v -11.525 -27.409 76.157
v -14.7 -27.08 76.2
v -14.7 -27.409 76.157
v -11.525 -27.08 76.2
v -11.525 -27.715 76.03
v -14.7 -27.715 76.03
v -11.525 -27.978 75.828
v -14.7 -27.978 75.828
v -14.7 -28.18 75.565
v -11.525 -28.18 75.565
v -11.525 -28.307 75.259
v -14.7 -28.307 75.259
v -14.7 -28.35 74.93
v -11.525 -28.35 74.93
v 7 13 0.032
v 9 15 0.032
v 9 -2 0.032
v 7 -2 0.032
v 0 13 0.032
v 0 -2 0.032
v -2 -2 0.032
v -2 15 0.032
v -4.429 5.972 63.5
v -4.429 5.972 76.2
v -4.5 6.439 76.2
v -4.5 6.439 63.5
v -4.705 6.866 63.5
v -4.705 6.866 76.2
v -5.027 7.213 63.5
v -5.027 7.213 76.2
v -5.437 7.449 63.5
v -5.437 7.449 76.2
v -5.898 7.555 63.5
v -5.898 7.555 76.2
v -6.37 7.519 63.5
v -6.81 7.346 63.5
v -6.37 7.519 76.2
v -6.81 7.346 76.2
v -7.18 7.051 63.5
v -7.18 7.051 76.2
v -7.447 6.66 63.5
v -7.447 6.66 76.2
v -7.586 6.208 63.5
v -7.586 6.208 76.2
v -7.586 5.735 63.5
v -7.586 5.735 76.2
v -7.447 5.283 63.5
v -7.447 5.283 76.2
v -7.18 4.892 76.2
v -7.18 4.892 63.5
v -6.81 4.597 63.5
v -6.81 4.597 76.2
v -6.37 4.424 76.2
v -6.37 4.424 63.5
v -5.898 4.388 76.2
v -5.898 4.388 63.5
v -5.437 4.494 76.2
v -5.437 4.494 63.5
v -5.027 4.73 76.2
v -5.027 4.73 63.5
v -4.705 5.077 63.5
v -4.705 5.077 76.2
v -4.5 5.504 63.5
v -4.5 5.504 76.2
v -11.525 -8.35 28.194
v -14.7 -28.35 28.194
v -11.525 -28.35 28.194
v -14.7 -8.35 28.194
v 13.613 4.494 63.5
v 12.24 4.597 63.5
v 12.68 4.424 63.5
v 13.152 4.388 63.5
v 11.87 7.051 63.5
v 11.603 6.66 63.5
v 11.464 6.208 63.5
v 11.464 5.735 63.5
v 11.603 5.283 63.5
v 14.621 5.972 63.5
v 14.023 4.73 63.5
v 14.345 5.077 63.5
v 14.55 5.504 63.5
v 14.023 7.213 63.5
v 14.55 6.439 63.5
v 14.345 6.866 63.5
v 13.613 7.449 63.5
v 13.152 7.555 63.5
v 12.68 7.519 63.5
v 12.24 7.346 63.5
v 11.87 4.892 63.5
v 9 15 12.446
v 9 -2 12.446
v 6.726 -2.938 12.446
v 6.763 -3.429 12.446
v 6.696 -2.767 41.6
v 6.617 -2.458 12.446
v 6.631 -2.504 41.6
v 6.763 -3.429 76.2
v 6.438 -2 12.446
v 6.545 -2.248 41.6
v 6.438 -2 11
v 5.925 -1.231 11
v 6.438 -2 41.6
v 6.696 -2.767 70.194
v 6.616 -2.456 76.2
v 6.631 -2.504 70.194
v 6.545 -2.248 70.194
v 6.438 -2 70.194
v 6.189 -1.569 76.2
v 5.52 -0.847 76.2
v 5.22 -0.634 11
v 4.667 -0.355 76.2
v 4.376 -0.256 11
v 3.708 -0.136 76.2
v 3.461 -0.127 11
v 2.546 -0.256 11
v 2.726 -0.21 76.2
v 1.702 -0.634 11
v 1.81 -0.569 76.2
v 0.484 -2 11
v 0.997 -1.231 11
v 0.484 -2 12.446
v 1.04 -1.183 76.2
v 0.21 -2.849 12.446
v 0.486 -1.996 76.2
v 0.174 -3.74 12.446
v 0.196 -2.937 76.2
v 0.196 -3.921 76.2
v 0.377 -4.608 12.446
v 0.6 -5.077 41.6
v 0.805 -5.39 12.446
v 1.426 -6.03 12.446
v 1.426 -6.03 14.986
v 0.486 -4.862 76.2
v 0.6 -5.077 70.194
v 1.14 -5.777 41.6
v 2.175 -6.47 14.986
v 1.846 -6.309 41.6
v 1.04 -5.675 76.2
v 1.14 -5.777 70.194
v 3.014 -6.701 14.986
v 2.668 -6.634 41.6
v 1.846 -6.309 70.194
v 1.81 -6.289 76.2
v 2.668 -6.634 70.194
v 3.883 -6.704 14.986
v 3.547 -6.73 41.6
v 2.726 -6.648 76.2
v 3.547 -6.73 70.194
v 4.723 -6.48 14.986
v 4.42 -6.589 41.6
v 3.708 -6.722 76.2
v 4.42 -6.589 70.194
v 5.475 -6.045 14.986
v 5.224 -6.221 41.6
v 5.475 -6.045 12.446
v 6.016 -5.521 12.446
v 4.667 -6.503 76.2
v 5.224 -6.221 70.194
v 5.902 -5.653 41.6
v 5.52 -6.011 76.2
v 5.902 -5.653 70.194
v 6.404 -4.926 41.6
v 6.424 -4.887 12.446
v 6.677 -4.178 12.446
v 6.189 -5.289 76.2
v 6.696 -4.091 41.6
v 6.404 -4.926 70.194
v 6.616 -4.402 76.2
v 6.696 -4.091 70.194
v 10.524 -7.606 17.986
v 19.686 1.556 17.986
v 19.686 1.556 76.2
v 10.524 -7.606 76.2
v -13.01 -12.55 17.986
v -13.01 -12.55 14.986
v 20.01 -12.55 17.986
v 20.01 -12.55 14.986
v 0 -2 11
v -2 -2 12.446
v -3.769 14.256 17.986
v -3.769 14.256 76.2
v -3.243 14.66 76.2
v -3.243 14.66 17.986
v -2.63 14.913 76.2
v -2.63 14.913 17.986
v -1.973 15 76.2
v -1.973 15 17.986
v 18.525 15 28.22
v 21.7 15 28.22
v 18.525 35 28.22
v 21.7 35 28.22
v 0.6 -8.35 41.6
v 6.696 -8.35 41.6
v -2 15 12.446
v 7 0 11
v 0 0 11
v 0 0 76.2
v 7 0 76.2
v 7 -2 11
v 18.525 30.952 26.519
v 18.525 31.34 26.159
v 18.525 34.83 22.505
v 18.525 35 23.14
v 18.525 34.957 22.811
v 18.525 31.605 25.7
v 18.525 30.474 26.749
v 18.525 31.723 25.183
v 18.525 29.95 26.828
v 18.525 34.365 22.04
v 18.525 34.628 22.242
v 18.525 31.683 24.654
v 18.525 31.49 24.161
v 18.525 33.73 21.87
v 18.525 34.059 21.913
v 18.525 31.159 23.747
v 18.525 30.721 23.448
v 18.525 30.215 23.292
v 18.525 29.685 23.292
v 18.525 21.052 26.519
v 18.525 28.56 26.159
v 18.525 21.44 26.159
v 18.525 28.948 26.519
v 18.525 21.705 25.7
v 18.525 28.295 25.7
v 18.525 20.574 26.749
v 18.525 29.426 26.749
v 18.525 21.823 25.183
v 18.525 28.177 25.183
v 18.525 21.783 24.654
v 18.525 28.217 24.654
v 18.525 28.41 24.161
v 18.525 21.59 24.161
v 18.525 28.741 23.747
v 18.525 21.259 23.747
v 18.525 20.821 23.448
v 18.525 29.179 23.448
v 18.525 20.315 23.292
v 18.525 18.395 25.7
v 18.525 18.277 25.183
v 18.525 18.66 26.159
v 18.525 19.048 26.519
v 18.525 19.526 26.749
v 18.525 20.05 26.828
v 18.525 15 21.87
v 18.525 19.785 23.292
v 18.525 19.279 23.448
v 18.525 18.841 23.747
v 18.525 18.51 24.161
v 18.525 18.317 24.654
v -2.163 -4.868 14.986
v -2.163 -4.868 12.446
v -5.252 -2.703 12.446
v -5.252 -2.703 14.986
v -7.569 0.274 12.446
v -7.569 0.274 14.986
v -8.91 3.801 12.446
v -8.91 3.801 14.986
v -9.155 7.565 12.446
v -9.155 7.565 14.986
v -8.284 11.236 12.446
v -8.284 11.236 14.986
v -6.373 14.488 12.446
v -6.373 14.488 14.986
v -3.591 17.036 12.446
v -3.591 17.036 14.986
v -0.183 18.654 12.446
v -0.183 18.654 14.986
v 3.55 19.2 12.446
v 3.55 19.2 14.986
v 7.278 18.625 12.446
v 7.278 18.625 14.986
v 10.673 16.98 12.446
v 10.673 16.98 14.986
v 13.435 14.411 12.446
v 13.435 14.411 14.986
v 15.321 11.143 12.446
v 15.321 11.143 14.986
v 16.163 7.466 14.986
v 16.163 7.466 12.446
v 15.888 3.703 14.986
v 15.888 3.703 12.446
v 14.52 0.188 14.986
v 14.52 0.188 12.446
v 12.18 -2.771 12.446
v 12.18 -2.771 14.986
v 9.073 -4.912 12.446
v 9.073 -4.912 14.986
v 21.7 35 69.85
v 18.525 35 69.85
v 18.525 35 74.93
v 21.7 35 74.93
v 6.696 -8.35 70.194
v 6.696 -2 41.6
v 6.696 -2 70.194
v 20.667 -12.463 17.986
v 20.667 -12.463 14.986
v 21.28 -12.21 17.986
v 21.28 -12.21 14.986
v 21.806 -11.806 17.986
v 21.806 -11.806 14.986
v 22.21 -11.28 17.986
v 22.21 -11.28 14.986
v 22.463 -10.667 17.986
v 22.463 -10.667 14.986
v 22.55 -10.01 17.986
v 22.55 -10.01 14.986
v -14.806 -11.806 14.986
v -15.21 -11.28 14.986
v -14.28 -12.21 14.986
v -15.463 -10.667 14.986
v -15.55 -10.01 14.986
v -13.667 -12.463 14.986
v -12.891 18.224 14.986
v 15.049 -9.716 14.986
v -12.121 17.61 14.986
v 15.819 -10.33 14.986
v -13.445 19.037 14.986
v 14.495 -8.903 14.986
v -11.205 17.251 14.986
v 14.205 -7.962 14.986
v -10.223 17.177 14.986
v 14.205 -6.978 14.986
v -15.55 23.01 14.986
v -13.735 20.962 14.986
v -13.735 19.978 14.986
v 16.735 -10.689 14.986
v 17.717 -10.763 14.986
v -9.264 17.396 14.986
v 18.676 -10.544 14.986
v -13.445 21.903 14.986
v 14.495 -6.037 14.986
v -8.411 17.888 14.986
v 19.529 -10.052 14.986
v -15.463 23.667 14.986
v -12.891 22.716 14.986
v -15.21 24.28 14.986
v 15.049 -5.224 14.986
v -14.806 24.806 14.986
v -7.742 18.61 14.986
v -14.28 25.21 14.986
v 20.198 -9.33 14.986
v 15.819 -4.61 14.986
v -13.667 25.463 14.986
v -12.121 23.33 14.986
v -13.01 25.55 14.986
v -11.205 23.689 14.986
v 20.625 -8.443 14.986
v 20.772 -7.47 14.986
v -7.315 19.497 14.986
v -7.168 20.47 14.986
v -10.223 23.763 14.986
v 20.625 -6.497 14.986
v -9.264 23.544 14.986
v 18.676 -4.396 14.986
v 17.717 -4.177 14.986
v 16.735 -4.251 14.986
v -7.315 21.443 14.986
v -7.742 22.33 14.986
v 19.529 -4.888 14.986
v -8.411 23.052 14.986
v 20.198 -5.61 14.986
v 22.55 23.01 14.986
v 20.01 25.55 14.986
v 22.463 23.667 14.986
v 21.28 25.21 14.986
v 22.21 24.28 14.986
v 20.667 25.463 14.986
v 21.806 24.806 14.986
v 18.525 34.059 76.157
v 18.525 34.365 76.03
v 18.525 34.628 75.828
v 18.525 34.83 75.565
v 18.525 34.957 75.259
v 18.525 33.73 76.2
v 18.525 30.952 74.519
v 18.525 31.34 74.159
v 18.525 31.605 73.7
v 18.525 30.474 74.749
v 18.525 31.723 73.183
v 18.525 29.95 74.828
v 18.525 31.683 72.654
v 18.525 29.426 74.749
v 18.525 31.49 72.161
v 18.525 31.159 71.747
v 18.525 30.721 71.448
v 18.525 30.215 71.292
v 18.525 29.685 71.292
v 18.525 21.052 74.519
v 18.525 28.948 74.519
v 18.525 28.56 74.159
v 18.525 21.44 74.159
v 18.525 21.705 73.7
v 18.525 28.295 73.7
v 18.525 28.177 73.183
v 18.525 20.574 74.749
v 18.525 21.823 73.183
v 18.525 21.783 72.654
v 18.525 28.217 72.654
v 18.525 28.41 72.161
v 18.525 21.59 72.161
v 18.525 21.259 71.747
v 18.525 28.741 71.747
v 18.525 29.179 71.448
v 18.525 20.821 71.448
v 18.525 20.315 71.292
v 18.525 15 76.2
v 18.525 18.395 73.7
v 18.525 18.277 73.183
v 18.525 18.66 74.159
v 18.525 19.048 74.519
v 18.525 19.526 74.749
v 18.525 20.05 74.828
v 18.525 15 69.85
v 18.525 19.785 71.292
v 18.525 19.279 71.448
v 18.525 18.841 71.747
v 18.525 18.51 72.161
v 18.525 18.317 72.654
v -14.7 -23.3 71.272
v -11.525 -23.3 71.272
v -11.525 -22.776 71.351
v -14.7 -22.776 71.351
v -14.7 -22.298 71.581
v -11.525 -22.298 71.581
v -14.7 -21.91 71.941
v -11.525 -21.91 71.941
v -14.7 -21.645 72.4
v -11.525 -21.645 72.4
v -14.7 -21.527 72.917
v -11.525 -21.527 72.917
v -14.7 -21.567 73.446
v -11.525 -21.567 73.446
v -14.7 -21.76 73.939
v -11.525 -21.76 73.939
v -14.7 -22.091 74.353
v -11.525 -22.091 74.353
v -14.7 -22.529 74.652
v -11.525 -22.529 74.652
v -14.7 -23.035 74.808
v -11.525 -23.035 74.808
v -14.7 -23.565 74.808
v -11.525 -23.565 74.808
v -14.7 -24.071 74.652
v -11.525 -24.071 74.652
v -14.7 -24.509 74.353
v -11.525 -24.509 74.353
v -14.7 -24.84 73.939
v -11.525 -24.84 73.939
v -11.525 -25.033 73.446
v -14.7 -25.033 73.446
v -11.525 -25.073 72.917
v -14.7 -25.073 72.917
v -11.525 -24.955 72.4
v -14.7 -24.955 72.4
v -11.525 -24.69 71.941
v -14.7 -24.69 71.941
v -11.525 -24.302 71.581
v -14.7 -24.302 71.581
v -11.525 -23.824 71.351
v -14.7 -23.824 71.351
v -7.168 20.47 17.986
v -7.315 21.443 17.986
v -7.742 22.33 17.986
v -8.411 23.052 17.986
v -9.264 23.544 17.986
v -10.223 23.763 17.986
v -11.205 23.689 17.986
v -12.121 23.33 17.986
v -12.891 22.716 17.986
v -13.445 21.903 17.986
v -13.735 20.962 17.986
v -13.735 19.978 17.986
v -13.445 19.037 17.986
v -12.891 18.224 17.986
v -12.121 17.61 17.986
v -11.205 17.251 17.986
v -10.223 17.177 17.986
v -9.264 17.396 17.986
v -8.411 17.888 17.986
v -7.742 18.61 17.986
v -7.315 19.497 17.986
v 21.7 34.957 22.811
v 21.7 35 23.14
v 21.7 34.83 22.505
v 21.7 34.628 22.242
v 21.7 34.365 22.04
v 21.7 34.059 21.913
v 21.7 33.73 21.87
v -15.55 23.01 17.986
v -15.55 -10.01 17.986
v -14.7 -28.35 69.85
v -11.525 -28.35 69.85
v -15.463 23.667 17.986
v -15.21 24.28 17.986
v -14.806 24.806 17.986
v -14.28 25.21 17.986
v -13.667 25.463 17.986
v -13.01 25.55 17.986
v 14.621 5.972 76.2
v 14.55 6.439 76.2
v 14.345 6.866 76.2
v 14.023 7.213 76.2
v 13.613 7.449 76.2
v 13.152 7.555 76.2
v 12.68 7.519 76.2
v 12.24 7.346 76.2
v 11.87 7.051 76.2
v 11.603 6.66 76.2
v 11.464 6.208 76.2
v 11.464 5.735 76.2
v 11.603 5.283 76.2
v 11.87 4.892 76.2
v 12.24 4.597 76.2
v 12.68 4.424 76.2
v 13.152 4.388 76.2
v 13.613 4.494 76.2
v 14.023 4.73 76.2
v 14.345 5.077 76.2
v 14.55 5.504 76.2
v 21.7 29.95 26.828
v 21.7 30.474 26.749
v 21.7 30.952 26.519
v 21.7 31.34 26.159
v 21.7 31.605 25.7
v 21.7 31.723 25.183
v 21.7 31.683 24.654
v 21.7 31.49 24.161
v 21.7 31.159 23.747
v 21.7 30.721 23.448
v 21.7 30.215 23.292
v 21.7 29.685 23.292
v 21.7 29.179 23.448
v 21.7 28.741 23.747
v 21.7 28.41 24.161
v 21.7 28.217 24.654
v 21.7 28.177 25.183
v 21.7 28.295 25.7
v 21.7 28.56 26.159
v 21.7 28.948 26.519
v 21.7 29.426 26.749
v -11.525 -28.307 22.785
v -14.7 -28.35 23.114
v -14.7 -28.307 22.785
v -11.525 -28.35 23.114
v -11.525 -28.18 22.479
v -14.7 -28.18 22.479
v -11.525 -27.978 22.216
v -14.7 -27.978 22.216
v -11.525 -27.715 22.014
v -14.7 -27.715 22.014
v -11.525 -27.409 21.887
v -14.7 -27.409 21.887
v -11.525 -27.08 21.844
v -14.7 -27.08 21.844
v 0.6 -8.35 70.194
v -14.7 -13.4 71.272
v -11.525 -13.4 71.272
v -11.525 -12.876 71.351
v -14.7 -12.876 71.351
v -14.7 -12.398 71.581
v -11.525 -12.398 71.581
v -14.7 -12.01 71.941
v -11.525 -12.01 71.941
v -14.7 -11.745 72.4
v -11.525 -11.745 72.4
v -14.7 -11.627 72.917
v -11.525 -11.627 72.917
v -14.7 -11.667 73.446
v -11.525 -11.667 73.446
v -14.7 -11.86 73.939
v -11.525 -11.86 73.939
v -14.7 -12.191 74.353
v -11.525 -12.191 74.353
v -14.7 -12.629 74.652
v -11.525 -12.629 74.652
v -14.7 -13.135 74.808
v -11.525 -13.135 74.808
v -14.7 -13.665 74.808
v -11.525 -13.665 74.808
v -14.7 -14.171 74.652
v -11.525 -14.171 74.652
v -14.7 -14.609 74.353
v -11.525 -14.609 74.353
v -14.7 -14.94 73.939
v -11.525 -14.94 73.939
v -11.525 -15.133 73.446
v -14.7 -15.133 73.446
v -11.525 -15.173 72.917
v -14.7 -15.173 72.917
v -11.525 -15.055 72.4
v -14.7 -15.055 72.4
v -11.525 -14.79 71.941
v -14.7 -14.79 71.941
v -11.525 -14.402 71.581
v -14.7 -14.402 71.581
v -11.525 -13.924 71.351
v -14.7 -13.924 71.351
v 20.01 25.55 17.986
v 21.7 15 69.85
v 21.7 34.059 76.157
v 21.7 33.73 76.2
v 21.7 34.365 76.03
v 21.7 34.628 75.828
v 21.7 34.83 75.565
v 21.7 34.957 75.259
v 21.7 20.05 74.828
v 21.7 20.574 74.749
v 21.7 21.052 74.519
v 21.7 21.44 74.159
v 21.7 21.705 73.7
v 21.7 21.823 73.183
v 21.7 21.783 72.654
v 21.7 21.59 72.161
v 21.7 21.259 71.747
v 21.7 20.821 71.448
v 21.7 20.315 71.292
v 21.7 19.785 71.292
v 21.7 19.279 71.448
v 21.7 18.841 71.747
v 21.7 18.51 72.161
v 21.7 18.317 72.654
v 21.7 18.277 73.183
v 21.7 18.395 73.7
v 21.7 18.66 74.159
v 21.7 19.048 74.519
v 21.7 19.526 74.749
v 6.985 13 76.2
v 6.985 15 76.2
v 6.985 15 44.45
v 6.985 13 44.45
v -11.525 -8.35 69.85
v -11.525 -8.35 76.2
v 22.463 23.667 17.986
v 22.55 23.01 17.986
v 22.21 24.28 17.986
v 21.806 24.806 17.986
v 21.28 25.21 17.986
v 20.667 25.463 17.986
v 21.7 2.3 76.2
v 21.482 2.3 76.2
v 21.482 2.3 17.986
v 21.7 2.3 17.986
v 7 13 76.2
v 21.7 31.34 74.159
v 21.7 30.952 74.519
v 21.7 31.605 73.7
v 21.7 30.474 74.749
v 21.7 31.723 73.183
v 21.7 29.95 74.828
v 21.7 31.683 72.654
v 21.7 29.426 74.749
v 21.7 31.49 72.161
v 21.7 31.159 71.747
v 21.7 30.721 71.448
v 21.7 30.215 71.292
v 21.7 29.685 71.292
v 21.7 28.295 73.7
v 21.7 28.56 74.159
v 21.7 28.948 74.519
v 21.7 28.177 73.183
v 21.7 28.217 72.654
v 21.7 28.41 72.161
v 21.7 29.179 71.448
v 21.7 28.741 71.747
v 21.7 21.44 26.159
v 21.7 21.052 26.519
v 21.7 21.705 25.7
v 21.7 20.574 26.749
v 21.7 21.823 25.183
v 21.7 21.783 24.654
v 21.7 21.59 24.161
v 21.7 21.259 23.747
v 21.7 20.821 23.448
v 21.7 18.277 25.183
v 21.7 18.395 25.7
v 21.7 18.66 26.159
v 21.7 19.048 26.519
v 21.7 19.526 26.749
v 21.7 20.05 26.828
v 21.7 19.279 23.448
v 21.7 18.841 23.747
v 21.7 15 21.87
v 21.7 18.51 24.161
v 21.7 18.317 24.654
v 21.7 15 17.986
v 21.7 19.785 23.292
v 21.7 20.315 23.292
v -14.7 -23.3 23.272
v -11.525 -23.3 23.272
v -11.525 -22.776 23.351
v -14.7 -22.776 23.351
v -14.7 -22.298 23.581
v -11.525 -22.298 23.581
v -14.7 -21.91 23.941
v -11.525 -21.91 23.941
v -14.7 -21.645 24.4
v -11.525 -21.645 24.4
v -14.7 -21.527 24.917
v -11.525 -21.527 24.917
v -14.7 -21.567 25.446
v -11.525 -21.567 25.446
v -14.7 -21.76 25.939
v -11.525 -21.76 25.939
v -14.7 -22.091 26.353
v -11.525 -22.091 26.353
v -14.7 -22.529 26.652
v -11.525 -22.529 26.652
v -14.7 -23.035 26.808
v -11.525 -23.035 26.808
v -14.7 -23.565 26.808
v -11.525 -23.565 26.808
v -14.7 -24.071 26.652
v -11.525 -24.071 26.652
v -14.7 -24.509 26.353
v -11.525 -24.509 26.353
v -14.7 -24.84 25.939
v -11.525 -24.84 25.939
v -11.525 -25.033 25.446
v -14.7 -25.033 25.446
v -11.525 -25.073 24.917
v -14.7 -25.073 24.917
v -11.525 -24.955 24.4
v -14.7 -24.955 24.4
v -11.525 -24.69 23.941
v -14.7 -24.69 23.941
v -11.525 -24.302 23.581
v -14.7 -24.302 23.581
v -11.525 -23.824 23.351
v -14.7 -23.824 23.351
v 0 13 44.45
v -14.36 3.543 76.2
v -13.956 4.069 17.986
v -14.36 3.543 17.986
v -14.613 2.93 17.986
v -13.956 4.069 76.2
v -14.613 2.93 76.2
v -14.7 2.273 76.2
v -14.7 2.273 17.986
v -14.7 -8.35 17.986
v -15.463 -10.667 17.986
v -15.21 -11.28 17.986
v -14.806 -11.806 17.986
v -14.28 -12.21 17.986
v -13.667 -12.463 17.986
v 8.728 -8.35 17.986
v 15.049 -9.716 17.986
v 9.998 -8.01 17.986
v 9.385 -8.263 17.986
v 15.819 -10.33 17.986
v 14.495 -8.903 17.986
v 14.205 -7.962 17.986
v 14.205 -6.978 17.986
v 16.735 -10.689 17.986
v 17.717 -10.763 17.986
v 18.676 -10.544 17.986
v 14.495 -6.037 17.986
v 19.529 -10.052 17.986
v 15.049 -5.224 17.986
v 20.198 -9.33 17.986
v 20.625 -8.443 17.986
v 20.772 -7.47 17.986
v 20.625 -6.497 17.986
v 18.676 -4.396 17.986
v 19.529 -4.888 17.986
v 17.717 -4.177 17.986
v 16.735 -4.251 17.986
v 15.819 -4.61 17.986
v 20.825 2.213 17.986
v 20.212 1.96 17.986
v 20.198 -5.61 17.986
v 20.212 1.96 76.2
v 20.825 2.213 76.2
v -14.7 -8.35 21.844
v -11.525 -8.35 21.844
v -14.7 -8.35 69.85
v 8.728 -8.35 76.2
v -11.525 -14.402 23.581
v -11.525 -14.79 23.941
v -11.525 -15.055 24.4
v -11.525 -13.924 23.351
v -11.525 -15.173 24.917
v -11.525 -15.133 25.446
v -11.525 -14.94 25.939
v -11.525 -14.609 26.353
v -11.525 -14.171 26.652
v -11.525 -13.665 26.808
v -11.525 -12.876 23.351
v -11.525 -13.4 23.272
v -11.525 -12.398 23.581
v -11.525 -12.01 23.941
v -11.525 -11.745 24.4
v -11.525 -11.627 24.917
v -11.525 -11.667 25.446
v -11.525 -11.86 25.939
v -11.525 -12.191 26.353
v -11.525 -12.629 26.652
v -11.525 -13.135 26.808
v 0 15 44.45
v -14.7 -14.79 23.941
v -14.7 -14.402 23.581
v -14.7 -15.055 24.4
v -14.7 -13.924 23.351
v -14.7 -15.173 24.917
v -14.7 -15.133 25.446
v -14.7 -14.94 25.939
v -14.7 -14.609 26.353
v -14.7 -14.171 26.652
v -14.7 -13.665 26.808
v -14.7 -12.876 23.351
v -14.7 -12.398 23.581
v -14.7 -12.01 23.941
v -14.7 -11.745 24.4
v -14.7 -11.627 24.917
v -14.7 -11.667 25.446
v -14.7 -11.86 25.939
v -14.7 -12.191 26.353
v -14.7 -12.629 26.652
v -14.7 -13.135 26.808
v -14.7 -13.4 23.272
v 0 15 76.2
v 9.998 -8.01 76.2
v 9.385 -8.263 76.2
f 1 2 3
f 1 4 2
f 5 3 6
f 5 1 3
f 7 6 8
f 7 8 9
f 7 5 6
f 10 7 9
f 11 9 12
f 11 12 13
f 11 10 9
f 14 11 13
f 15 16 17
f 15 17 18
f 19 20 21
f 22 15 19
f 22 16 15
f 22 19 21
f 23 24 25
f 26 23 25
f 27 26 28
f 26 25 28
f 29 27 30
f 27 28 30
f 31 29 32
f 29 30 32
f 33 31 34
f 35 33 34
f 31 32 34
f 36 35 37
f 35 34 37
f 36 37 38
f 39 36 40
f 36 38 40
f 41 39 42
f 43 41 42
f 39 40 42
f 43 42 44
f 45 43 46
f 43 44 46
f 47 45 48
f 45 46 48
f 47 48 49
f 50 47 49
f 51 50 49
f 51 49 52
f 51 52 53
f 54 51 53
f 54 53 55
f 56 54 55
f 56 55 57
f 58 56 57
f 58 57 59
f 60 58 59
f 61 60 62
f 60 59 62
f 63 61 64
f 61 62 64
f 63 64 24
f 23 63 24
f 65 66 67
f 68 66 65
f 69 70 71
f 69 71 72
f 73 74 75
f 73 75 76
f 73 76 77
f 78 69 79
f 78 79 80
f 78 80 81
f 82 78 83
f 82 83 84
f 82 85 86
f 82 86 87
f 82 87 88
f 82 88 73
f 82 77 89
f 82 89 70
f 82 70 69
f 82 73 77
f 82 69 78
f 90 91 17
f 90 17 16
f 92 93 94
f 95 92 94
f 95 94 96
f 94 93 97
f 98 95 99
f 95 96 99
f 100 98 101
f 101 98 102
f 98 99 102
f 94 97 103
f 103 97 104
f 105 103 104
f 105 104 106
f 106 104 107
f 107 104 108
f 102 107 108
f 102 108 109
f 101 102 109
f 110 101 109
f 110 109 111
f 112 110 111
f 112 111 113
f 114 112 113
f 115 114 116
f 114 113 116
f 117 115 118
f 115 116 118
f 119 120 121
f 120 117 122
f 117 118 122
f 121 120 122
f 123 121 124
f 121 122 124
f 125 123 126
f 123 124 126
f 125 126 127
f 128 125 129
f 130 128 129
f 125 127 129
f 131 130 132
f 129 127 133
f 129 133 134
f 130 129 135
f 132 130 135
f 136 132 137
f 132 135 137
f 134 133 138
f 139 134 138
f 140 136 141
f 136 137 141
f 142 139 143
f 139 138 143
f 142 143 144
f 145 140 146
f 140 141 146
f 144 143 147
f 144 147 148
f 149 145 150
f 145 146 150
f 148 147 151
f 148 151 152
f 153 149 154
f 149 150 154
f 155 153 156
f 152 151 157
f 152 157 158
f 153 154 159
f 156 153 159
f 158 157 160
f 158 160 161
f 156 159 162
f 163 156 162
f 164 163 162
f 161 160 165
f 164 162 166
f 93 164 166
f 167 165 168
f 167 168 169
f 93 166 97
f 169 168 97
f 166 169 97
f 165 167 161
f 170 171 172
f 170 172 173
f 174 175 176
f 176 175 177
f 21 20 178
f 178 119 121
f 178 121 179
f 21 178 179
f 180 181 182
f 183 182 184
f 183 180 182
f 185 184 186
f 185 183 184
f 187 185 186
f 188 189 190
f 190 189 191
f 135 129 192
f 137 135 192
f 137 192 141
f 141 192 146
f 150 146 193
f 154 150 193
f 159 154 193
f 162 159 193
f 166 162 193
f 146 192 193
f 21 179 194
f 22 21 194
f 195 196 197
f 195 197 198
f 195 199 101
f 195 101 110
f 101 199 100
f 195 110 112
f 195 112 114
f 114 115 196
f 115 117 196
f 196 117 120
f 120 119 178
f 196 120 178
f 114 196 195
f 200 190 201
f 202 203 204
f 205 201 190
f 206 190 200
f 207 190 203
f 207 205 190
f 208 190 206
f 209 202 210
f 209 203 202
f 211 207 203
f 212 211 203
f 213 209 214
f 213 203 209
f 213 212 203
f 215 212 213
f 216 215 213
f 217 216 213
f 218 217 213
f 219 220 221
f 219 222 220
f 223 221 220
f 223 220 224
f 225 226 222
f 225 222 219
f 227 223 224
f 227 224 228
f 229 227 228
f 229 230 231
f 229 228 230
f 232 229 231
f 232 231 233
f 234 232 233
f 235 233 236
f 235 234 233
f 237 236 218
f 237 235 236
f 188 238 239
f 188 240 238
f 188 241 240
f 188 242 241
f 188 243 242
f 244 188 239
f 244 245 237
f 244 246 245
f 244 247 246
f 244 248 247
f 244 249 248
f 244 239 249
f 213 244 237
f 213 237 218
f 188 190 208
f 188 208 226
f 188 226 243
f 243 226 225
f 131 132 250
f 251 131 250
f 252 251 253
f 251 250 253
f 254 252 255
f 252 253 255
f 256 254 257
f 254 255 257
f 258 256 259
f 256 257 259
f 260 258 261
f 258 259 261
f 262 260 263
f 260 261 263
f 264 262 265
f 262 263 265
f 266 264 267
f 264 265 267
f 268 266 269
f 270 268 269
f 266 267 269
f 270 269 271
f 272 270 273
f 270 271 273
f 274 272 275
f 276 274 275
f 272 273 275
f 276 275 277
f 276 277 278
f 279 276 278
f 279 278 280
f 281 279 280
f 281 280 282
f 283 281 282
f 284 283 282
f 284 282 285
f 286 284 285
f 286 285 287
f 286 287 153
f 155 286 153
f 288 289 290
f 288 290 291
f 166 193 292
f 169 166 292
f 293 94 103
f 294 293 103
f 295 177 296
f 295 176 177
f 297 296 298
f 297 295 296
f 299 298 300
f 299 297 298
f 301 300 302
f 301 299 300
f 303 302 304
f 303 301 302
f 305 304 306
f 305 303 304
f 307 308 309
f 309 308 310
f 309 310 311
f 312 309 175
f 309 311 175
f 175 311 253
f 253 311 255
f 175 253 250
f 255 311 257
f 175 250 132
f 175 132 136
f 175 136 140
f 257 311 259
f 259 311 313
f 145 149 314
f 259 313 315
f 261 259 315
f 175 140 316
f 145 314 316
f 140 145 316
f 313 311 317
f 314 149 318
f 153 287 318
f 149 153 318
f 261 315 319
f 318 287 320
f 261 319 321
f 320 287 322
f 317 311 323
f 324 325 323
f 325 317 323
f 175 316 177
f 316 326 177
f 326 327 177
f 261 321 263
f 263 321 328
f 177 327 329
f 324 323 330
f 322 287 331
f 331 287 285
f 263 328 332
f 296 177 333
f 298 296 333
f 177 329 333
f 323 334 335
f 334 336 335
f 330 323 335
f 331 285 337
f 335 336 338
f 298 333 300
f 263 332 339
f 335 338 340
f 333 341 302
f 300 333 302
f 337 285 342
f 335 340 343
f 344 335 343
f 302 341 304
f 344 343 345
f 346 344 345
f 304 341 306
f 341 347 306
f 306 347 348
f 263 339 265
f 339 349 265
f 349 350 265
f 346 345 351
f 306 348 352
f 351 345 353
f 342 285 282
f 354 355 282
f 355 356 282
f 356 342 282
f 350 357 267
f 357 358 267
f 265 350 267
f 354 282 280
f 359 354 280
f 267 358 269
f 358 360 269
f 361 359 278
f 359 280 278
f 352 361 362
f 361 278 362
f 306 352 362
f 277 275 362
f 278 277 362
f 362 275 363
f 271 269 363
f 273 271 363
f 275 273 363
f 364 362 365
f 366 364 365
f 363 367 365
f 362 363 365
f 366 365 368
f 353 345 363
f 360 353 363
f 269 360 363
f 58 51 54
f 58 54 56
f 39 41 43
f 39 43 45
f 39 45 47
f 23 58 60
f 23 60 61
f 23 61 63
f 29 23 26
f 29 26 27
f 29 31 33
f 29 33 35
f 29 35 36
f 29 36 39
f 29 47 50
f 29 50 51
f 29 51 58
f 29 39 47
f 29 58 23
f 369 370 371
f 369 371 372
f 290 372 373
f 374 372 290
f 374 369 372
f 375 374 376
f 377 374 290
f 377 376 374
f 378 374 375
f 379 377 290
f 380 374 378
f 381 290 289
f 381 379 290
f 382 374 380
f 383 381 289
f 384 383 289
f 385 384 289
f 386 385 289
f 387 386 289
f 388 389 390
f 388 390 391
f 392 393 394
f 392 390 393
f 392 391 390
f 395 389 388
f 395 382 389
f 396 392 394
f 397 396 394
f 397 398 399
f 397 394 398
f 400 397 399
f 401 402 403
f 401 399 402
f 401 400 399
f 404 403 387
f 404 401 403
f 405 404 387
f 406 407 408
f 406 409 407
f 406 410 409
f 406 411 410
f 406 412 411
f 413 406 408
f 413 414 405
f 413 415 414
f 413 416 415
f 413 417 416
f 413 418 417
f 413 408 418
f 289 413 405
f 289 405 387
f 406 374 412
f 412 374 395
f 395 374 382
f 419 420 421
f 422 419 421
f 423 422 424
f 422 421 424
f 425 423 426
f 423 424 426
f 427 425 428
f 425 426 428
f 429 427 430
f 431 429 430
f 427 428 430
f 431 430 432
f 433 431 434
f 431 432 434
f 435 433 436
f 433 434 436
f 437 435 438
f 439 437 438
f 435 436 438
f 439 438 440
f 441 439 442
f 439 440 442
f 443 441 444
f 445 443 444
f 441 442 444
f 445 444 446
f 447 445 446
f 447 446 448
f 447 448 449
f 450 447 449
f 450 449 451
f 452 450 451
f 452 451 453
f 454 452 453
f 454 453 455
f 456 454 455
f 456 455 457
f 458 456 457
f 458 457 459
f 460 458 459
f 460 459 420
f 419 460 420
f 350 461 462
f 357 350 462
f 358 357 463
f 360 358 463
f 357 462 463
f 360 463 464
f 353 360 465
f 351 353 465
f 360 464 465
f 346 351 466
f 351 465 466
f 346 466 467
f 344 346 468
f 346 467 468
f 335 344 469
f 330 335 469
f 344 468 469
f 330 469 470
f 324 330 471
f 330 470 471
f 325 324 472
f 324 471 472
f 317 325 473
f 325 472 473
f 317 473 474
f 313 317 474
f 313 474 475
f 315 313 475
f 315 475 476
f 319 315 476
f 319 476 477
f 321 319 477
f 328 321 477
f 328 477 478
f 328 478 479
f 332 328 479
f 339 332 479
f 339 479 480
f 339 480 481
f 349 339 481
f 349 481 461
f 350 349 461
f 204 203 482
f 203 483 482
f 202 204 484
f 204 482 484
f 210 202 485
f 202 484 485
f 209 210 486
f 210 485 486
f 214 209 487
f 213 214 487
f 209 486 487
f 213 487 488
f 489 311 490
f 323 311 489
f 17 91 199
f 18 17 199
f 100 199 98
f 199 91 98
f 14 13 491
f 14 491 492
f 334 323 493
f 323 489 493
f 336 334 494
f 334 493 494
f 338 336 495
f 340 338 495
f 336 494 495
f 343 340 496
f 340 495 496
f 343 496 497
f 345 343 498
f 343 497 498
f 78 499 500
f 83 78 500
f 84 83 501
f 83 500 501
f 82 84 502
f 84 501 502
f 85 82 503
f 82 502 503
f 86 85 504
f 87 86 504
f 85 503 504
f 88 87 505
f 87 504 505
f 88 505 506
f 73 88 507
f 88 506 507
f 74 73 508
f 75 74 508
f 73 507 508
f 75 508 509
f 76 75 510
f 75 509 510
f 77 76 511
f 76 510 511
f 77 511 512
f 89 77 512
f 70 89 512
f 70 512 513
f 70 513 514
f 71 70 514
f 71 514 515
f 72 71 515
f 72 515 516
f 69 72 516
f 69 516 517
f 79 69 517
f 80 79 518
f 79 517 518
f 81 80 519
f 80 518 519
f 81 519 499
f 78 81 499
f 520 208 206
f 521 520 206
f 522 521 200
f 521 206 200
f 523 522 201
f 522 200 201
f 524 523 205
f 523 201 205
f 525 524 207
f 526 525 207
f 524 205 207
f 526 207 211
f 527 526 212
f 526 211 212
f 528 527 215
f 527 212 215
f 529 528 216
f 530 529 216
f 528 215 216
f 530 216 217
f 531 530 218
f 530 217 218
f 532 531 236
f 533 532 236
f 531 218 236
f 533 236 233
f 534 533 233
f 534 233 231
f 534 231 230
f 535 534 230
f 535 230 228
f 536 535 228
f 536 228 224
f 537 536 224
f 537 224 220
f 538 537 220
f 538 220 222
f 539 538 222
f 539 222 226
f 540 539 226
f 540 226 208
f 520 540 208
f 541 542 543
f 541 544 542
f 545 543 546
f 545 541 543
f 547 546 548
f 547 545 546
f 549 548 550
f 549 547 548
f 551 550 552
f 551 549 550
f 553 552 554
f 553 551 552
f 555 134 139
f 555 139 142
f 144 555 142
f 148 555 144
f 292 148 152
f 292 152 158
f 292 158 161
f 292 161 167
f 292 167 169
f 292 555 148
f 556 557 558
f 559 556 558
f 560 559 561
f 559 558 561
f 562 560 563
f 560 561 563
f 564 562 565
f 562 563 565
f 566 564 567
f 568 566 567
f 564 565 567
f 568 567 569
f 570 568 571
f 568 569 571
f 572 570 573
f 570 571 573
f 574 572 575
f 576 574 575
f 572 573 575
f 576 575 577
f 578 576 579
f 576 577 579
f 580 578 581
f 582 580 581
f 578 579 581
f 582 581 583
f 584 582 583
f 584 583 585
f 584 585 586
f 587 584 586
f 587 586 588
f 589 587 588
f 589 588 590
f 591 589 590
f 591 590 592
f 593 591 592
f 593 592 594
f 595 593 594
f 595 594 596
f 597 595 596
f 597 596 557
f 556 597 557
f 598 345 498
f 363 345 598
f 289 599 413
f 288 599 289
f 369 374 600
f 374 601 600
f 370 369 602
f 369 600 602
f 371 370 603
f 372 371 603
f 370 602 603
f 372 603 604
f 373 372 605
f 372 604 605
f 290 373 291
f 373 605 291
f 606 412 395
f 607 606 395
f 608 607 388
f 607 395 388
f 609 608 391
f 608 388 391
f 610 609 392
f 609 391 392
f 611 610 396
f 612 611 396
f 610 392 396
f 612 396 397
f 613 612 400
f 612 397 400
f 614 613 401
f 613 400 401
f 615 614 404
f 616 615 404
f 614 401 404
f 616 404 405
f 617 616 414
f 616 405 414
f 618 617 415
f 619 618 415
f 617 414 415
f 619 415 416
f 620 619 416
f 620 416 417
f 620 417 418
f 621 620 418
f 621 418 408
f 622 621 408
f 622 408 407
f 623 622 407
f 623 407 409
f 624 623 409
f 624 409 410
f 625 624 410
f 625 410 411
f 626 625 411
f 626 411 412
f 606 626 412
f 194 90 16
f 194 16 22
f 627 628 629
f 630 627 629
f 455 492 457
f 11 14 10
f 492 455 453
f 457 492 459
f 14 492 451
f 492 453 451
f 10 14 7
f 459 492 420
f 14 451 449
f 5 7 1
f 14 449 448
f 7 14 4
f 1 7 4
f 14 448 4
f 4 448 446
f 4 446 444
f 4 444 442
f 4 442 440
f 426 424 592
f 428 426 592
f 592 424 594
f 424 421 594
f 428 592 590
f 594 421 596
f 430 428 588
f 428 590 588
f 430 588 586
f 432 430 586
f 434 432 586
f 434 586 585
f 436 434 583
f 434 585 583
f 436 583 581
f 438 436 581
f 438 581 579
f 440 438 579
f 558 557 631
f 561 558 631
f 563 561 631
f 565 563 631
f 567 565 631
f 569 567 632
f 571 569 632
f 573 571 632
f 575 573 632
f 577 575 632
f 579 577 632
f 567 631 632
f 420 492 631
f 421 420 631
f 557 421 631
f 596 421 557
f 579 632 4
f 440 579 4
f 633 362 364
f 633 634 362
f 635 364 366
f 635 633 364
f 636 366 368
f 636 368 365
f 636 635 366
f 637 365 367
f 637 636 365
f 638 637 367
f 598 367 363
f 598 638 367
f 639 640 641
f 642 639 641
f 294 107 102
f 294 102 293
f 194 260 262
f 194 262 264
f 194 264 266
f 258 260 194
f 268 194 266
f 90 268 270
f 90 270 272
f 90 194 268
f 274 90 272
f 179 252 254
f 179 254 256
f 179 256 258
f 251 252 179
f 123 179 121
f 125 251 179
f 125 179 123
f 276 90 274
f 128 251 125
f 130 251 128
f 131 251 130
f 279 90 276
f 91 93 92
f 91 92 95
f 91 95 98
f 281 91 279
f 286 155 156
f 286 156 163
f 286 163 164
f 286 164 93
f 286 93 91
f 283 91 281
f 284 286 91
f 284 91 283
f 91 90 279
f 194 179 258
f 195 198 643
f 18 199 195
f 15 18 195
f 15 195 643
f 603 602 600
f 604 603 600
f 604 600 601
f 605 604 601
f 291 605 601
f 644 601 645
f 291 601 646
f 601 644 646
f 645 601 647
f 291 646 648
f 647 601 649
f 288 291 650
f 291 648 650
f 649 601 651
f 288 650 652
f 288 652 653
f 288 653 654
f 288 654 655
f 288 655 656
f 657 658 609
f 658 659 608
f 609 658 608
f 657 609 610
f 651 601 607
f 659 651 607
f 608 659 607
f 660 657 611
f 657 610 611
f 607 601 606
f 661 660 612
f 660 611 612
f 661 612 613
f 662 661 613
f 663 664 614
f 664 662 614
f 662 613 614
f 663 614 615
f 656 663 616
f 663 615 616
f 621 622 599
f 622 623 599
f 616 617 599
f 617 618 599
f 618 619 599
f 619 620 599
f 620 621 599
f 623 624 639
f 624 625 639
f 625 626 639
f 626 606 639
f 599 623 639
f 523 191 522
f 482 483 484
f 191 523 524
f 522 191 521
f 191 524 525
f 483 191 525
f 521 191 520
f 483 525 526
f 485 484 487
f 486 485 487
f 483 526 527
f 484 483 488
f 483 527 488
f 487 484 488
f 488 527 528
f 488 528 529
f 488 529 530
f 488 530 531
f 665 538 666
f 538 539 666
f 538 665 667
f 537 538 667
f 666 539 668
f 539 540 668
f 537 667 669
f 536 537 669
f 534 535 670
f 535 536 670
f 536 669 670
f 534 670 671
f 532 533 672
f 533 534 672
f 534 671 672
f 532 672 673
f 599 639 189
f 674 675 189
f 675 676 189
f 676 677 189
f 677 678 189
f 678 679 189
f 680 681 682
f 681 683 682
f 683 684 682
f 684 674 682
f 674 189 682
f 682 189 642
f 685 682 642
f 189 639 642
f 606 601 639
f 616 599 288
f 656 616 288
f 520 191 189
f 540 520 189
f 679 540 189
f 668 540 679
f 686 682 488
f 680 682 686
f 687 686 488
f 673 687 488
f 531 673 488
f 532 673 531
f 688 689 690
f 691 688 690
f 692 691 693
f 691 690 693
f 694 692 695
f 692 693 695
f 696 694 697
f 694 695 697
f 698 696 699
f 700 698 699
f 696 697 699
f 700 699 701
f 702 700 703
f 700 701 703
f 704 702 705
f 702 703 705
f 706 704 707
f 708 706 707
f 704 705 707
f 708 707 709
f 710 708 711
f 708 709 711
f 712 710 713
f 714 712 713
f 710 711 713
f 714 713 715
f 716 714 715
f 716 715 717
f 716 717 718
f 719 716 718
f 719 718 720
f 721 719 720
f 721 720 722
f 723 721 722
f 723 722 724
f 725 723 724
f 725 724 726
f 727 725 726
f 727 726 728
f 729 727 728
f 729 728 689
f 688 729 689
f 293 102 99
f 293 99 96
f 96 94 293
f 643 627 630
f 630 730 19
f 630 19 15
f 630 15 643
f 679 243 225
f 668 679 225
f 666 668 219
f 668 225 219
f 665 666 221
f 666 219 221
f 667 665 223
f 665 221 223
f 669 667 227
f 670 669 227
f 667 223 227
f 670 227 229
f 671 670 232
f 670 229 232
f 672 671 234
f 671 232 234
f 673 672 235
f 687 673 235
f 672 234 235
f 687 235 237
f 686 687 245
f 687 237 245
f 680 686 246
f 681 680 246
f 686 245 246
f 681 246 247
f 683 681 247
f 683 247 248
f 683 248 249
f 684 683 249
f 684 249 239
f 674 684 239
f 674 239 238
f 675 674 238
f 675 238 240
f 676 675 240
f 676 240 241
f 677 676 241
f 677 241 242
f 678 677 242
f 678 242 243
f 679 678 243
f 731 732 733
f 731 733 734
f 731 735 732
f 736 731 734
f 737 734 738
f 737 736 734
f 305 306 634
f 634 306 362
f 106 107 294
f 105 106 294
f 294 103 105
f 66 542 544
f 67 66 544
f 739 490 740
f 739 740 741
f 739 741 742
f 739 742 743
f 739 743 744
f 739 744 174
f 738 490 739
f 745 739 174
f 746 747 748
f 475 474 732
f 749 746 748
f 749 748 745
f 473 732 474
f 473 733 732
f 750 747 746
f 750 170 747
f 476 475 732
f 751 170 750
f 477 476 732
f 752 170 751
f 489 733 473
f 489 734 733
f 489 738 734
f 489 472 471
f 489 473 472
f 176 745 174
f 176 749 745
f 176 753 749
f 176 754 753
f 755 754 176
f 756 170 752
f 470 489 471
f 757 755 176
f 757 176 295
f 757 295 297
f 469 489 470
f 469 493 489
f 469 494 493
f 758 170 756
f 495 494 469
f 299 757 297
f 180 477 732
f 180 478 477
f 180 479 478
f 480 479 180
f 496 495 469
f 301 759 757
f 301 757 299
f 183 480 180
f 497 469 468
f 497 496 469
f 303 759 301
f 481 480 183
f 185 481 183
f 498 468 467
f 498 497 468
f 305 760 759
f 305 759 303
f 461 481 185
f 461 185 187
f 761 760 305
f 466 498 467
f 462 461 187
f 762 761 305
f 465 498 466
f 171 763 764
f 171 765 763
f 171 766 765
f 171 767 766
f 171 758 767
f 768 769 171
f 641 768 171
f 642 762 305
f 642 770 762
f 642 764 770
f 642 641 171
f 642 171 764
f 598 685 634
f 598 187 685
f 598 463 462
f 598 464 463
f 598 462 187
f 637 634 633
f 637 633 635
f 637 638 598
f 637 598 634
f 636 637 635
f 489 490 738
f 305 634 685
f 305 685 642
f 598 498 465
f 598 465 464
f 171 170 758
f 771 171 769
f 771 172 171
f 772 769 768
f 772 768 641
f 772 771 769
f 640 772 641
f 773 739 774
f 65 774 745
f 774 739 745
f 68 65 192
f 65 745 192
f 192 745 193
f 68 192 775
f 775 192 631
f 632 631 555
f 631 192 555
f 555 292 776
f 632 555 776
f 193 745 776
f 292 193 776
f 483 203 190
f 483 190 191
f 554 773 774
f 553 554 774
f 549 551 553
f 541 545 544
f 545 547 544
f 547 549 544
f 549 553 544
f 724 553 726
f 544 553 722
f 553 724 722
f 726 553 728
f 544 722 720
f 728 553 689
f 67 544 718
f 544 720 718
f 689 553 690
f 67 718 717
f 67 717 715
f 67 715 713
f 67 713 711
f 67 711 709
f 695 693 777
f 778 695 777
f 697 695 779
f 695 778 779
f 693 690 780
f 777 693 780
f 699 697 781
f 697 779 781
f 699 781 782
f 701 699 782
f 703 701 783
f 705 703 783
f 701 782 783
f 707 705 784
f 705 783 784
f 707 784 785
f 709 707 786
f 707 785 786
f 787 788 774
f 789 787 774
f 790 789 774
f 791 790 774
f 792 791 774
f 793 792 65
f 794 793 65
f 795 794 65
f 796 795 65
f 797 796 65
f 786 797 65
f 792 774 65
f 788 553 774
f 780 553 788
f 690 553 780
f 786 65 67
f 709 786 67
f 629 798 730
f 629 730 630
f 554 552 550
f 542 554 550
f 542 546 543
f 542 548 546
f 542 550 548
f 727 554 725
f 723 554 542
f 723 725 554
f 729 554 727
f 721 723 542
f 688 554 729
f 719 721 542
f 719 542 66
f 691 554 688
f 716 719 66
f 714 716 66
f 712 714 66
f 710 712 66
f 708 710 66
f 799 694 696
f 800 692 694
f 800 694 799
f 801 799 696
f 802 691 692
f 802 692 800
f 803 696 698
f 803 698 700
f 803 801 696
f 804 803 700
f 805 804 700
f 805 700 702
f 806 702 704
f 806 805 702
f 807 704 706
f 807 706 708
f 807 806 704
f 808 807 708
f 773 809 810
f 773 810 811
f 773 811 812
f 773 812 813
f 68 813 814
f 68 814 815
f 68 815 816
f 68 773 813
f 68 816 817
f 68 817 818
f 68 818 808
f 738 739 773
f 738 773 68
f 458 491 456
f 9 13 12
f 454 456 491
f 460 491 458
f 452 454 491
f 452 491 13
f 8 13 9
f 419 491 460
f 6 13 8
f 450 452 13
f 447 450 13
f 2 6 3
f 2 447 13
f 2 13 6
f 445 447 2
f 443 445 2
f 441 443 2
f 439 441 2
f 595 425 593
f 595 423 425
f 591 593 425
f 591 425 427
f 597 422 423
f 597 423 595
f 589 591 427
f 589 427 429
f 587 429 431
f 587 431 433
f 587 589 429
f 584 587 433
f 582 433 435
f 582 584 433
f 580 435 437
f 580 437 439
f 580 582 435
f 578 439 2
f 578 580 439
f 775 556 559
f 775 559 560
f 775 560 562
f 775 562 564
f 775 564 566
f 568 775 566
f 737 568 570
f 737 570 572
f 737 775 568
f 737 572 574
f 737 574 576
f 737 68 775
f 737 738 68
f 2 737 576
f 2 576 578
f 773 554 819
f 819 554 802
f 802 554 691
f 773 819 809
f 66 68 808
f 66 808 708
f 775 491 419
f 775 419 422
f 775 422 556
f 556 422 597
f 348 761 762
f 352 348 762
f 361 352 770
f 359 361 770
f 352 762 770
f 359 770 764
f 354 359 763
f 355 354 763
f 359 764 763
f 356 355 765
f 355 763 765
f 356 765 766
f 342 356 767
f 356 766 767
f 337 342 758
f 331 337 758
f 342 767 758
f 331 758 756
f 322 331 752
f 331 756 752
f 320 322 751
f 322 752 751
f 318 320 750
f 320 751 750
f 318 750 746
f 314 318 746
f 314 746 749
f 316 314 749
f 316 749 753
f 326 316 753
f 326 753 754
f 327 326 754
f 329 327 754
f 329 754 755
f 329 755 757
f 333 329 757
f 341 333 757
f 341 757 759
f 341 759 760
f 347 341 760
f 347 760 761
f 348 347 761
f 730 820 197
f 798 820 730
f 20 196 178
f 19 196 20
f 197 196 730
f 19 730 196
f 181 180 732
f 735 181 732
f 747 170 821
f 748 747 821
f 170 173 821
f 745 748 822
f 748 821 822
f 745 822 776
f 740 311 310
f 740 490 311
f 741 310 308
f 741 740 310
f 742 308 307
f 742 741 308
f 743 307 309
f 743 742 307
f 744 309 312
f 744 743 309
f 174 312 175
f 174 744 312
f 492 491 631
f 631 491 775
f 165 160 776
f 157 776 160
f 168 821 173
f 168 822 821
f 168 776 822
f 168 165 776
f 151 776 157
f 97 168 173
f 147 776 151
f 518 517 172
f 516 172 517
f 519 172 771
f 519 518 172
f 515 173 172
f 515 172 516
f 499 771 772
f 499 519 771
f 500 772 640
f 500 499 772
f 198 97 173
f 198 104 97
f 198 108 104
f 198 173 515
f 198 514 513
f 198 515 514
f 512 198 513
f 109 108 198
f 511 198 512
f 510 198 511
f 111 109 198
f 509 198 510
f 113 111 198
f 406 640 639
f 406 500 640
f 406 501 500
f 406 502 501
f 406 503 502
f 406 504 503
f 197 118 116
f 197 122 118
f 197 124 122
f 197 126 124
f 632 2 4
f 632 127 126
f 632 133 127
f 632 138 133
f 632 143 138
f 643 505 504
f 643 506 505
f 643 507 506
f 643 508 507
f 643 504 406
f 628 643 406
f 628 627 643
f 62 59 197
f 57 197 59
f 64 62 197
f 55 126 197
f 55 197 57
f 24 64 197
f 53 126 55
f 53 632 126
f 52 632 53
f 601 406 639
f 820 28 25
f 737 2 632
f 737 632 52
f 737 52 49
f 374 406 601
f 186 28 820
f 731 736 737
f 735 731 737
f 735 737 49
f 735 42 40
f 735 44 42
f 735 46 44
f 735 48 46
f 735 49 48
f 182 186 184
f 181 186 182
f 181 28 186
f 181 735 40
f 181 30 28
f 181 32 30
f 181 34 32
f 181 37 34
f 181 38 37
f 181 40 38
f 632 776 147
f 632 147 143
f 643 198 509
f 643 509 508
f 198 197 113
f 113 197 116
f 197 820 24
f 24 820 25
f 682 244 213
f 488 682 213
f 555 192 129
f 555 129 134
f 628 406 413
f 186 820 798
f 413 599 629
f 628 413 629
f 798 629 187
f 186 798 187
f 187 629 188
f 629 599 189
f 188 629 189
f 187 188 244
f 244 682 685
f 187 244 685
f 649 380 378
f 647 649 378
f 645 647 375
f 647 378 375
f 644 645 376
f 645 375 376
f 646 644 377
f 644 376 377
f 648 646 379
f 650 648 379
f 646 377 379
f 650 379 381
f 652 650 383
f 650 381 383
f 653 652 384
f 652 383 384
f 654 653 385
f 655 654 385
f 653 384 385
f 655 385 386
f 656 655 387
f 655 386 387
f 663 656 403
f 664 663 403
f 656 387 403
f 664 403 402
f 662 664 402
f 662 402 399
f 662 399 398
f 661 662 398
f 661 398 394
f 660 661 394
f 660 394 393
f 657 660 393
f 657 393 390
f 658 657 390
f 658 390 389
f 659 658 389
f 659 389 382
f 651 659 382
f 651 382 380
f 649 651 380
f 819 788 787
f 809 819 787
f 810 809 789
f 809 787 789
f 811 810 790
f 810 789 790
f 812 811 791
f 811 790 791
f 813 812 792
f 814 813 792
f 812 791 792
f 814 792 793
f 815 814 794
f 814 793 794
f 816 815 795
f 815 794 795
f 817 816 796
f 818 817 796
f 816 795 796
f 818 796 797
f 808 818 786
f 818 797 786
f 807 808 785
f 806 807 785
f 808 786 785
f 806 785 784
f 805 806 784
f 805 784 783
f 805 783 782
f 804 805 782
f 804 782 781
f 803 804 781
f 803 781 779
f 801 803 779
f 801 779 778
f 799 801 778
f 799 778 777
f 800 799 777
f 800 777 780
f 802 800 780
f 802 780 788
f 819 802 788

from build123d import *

# Parameters (mm, degrees)
SKETCH1_W           = 11
SKETCH1_H           = 17
SKETCH1_W_2         = 7
SKETCH1_H_2         = 13
BOSS_EXTRUDE1_DEPTH = 76.2
SKETCH2_W           = 11
SKETCH2_H           = 17
BOSS_EXTRUDE2_DEPTH = 2
SKETCH3_W           = 7
SKETCH3_H           = 11
CUT_EXTRUDE1_DEPTH  = 2
SKETCH4_W           = 38.1
SKETCH4_H           = 38.1
SKETCH4_W_2         = 11
SKETCH4_H_2         = 17
BOSS_EXTRUDE3_DEPTH = 3
SKETCH5_R           = 12.7
SKETCH5_W           = 11
SKETCH5_H           = 17
BOSS_EXTRUDE4_DEPTH = 2.54
SKETCH6_W           = 11
SKETCH6_H           = 58.214
BOSS_EXTRUDE5_DEPTH = 6.35
CUT_EXTRUDE2_REACH  = 87.303
SKETCH7_R           = 3.302
SKETCH8_W           = 6.985
SKETCH8_H           = 31.75
CUT_EXTRUDE3_DEPTH  = 6.35
SKETCH9_W           = 58.42
SKETCH9_H           = 12.7
BOSS_EXTRUDE6_DEPTH = 12.7
SKETCH10_W          = 3.175
SKETCH10_H          = 58.214
BOSS_EXTRUDE7_DEPTH = 20
SKETCH11_R          = 1.778
SKETCH11_W          = 3.884096392
SKETCH11_H          = 20
CUT_EXTRUDE4_DEPTH  = 91.512682122
FILLET1_R           = 1.27
CHAMFER1_SIZE       = 11.43
FILLET3_R           = 2.54
SKETCH12_W          = 58.214
SKETCH12_H          = 11.675
BOSS_EXTRUDE8_DEPTH = 12.7
SKETCH13_W          = 3.175
SKETCH13_H          = 54.356
BOSS_EXTRUDE9_DEPTH = 20
CHAMFER3_SIZE       = 12.7
FILLET4_R           = 2.54
SKETCH14_W          = 6.096
SKETCH14_H          = 28.594092226
CUT_EXTRUDE5_DEPTH  = 6.35
SKETCH15_R          = 1.778
CUT_EXTRUDE6_DEPTH  = 91.512682122
FILLET5_R           = 1.27
SKETCH16_R          = 1.5875
CUT_EXTRUDE7_DEPTH  = 12.7
FILLET6_R           = 2.54
SKETCH17_R          = 3.302
CUT_EXTRUDE8_DEPTH  = 72.570750283
SKETCH19_W          = 11
SKETCH19_H          = 17
CUT_EXTRUDE9_DEPTH  = 2.032
SKETCH21_W          = 41.629903608
SKETCH21_H          = 20
CUT_EXTRUDE10_DEPTH = 25.4
SKETCH22_W          = 41.656
SKETCH22_H          = 20
CUT_EXTRUDE11_DEPTH = 25.4


with BuildPart() as part:
    # Sketch1 → Boss-Extrude1 (new body)
    with BuildSketch(Plane.XY):
        with Locations((3.5, 6.5)):
            Rectangle(SKETCH1_W, SKETCH1_H)
        with Locations((3.5, 6.5)):
            Rectangle(SKETCH1_W_2, SKETCH1_H_2, mode=Mode.SUBTRACT)
    extrude(amount=BOSS_EXTRUDE1_DEPTH)

    # Sketch2 → Boss-Extrude2 (add)
    with BuildSketch(Plane(origin=(0, 0, 0), x_dir=(-1, 0, 0), z_dir=(0, 0, -1))):
        with Locations((-3.5, 6.5)):
            Rectangle(SKETCH2_W, SKETCH2_H)
    extrude(amount=BOSS_EXTRUDE2_DEPTH)

    # Sketch3 → Cut-Extrude1 (cut)
    with BuildSketch(Plane(origin=(0, -2, 0), x_dir=(-1, 0, 0), z_dir=(0, -1, 0))):
        with Locations((-3.5, -5.5)):
            Rectangle(SKETCH3_W, SKETCH3_H)
    extrude(amount=-CUT_EXTRUDE1_DEPTH, mode=Mode.SUBTRACT)

    # Sketch4 → Boss-Extrude3 (add)
    with BuildSketch(Plane.XY.offset(14.986)):
        with Locations((3.5, 6.5)):
            Rectangle(SKETCH4_W, SKETCH4_H)
        with Locations((3.5, 6.5)):
            Rectangle(SKETCH4_W_2, SKETCH4_H_2, mode=Mode.SUBTRACT)
    extrude(amount=BOSS_EXTRUDE3_DEPTH)

    # Sketch5 → Boss-Extrude4 (add)
    with BuildSketch(Plane(origin=(0, 0, 14.986), x_dir=(-1, 0, 0), z_dir=(0, 0, -1))):
        with Locations(Location((-3.5, 6.5, 0), (0, 0, 180))):
            Circle(SKETCH5_R)
        with Locations((-3.5, 6.5)):
            Rectangle(SKETCH5_W, SKETCH5_H, mode=Mode.SUBTRACT)
    extrude(amount=BOSS_EXTRUDE4_DEPTH)

    # Sketch6 → Boss-Extrude5 (add)
    with BuildSketch(Plane.XZ.offset(2)):
        with Locations((3.5, 47.093)):
            Rectangle(SKETCH6_W, SKETCH6_H)
    extrude(amount=BOSS_EXTRUDE5_DEPTH)

    # Cut-Extrude2: up to this face of the body (flat: up to its plane)
    cut_extrude2_end = Plane(part.part.faces().sort_by_distance((3.5, 6.5, -2))[0])
    # Sketch7 → Cut-Extrude2 (cut, up to the picked face)
    with BuildSketch(Plane.XY.offset(76.2), mode=Mode.PRIVATE) as cut_extrude2_sk1:
        with Locations((3.461, -3.429)):
            Circle(SKETCH7_R)
    cut_extrude2_tool1 = split(extrude(cut_extrude2_sk1.sketch, amount=-CUT_EXTRUDE2_REACH, mode=Mode.PRIVATE), bisect_by=cut_extrude2_end, keep=Keep.BOTH, mode=Mode.PRIVATE)
    add(cut_extrude2_tool1.solids().sort_by(Axis((3.461, -3.429, 76.2), (0, 0, -1)))[0], mode=Mode.SUBTRACT)

    # Sketch8 → Cut-Extrude3 (cut)
    with BuildSketch(Plane(origin=(0, 15, 0), x_dir=(1, 0, 0), z_dir=(0, 1, 0))):
        with Locations((3.4925, -60.325)):
            Rectangle(SKETCH8_W, SKETCH8_H)
    extrude(amount=-CUT_EXTRUDE3_DEPTH, mode=Mode.SUBTRACT)

    # Sketch9 → Boss-Extrude6 (add)
    with BuildSketch(Plane(origin=(9, 0, 0), x_dir=(0, 0, -1), z_dir=(1, 0, 0))):
        with Locations((-46.99, 8.65)):
            Rectangle(SKETCH9_W, SKETCH9_H)
    extrude(amount=BOSS_EXTRUDE6_DEPTH)

    # Sketch10 → Boss-Extrude7 (add)
    with BuildSketch(Plane(origin=(0, 15, 0), x_dir=(1, 0, 0), z_dir=(0, 1, 0))):
        with Locations((20.1125, -47.093)):
            Rectangle(SKETCH10_W, SKETCH10_H)
    extrude(amount=BOSS_EXTRUDE7_DEPTH)

    # Sketch11 → Cut-Extrude4 (cut, through all)
    with BuildSketch(Plane.ZY.offset(-18.525)):
        with Locations((25.05, 29.95)):
            Circle(SKETCH11_R)
        with Locations((25.05, 20.05)):
            Circle(SKETCH11_R)
        with Locations((73.05, 29.95)):
            Circle(SKETCH11_R)
        with Locations((73.05, 20.05)):
            Circle(SKETCH11_R)
        with Locations((19.928048196, 25)):
            Rectangle(SKETCH11_W, SKETCH11_H)
    extrude(amount=-CUT_EXTRUDE4_DEPTH, mode=Mode.SUBTRACT)

    # Fillet1
    fillet1_edges = [part.edges().sort_by_distance(p)[0] for p in [
        (20.1125, 35, 76.2),
        (20.1125, 35, 21.870096392),
    ]]
    fillet(fillet1_edges, radius=FILLET1_R)

    # Chamfer1
    # the kernel refuses this chamfer: 11.43 mm, written as the material it adds along each edge
    with BuildSketch(Plane(origin=(9, 2.3, 17.986), x_dir=(0.9996219169112968, 0.027495876610586382, 0), z_dir=(0, 0, 1))) as chamfer1_piece_1_section:
        Polygon((CHAMFER1_SIZE * 0.999621916911, -CHAMFER1_SIZE * 0.0274958766106), (-CHAMFER1_SIZE * 0.0274958766106, -CHAMFER1_SIZE * 0.999621916911), (0, 0), align=None)
    chamfer1_piece_1 = extrude(amount=58.214, mode=Mode.PRIVATE)
    chamfer1_piece_1 = split(chamfer1_piece_1, bisect_by=Plane(origin=(13.789958752, -8.35, 47.093), z_dir=(0, 1, 0)), keep=Keep.TOP, mode=Mode.PRIVATE)
    add(chamfer1_piece_1)

    # Fillet3
    fillet3_edges = [part.edges().sort_by_distance(p)[0] for p in [
        (20.43, 2.3, 47.093),
        (9.78, -8.35, 47.093),
    ]]
    fillet(fillet3_edges, radius=FILLET3_R)

    # Sketch12 → Boss-Extrude8 (add)
    with BuildSketch(Plane.ZY.offset(2)):
        with Locations((47.093, -2.5125)):
            Rectangle(SKETCH12_W, SKETCH12_H)
    extrude(amount=BOSS_EXTRUDE8_DEPTH)

    # Sketch13 → Boss-Extrude9 (add)
    with BuildSketch(Plane.XZ.offset(8.35)):
        with Locations((-13.1125, 49.022)):
            Rectangle(SKETCH13_W, SKETCH13_H)
    extrude(amount=BOSS_EXTRUDE9_DEPTH)

    # Chamfer3
    # the kernel refuses this chamfer: 12.7 mm, written as the material it adds along each edge
    with BuildSketch(Plane(origin=(-2, 3.325, 17.986), x_dir=(0.027495876610586365, 0.9996219169112966, 0), z_dir=(0, 0, 1))) as chamfer3_piece_1_section:
        Polygon((CHAMFER3_SIZE * 0.999621916911, CHAMFER3_SIZE * 0.0274958766106), (-CHAMFER3_SIZE * 0.0274958766106, CHAMFER3_SIZE * 0.999621916911), (0, 0), align=None)
    chamfer3_piece_1 = extrude(amount=58.214, mode=Mode.PRIVATE)
    chamfer3_piece_1 = split(chamfer3_piece_1, bisect_by=Plane(origin=(-6.232956887, 15, 47.093), z_dir=(0, -1, 0)), keep=Keep.TOP, mode=Mode.PRIVATE)
    chamfer3_piece_1 = split(chamfer3_piece_1, bisect_by=Plane(origin=(-14.7, 7.408033371, 47.093), z_dir=(1, 0, 0)), keep=Keep.TOP, mode=Mode.PRIVATE)
    add(chamfer3_piece_1)

    # Fillet4
    fillet4_edges = [part.edges().sort_by_distance(p)[0] for p in [
        (-14.7, 3.325, 47.093),
        (-3.025, 15, 47.093),
    ]]
    fillet(fillet4_edges, radius=FILLET4_R)

    # Sketch14 → Cut-Extrude5 (cut)
    with BuildSketch(Plane.XZ.offset(8.35)):
        with Locations((3.647897552, 55.896932406)):
            Rectangle(SKETCH14_W, SKETCH14_H)
    extrude(amount=-CUT_EXTRUDE5_DEPTH, mode=Mode.SUBTRACT)

    # Sketch15 → Cut-Extrude6 (cut, through all)
    with BuildSketch(Plane(origin=(-11.525, 0, 0), x_dir=(0, 0, -1), z_dir=(1, 0, 0))):
        with Locations((-73.05, -13.4)):
            Circle(SKETCH15_R)
        with Locations((-73.05, -23.3)):
            Circle(SKETCH15_R)
        with Locations((-25.05, -13.4)):
            Circle(SKETCH15_R)
        with Locations((-25.05, -23.3)):
            Circle(SKETCH15_R)
    extrude(amount=-CUT_EXTRUDE6_DEPTH, mode=Mode.SUBTRACT)

    # Fillet5
    fillet5_edges = [part.edges().sort_by_distance(p)[0] for p in [
        (-13.1125, -28.35, 21.844),
        (-13.1125, -28.35, 76.2),
    ]]
    fillet(fillet5_edges, radius=FILLET5_R)

    # Sketch16 → Cut-Extrude7 (cut)
    with BuildSketch(Plane.XY.offset(76.2)):
        with Locations((-6.016625, 5.971505071)):
            Circle(SKETCH16_R)
        with Locations((13.033375, 5.971505071)):
            Circle(SKETCH16_R)
    extrude(amount=-CUT_EXTRUDE7_DEPTH, mode=Mode.SUBTRACT)

    # Fillet6
    fillet6_edges = [part.edges().sort_by_distance(p)[0] for p in [
        (-15.55, 25.55, 16.486),
        (-15.55, -12.55, 16.486),
        (22.55, -12.55, 16.486),
        (22.55, 25.55, 16.486),
    ]]
    fillet(fillet6_edges, radius=FILLET6_R)

    # Sketch17 → Cut-Extrude8 (cut, through all)
    with BuildSketch(Plane.XY.offset(17.986)):
        with Locations((-10.47, 20.47)):
            Circle(SKETCH17_R)
        with Locations((17.47, -7.47)):
            Circle(SKETCH17_R)
    extrude(amount=-CUT_EXTRUDE8_DEPTH, mode=Mode.SUBTRACT)

    # Sketch19 → Cut-Extrude9 (cut)
    with BuildSketch(Plane(origin=(0, 0, -2), x_dir=(-1, 0, 0), z_dir=(0, 0, -1))):
        with Locations((-3.5, 6.5)):
            Rectangle(SKETCH19_W, SKETCH19_H)
    extrude(amount=-CUT_EXTRUDE9_DEPTH, mode=Mode.SUBTRACT)

    # Sketch21 → Cut-Extrude10 (cut)
    with BuildSketch(Plane(origin=(21.7, 0, 0), x_dir=(0, 0, -1), z_dir=(1, 0, 0))):
        with Locations((-49.035048196, 25)):
            Rectangle(SKETCH21_W, SKETCH21_H)
    extrude(amount=-CUT_EXTRUDE10_DEPTH, mode=Mode.SUBTRACT)

    # Sketch22 → Cut-Extrude11 (cut)
    with BuildSketch(Plane.ZY.offset(14.7)):
        with Locations((49.022, -18.35)):
            Rectangle(SKETCH22_W, SKETCH22_H)
    extrude(amount=-CUT_EXTRUDE11_DEPTH, mode=Mode.SUBTRACT)


solid = part.part
